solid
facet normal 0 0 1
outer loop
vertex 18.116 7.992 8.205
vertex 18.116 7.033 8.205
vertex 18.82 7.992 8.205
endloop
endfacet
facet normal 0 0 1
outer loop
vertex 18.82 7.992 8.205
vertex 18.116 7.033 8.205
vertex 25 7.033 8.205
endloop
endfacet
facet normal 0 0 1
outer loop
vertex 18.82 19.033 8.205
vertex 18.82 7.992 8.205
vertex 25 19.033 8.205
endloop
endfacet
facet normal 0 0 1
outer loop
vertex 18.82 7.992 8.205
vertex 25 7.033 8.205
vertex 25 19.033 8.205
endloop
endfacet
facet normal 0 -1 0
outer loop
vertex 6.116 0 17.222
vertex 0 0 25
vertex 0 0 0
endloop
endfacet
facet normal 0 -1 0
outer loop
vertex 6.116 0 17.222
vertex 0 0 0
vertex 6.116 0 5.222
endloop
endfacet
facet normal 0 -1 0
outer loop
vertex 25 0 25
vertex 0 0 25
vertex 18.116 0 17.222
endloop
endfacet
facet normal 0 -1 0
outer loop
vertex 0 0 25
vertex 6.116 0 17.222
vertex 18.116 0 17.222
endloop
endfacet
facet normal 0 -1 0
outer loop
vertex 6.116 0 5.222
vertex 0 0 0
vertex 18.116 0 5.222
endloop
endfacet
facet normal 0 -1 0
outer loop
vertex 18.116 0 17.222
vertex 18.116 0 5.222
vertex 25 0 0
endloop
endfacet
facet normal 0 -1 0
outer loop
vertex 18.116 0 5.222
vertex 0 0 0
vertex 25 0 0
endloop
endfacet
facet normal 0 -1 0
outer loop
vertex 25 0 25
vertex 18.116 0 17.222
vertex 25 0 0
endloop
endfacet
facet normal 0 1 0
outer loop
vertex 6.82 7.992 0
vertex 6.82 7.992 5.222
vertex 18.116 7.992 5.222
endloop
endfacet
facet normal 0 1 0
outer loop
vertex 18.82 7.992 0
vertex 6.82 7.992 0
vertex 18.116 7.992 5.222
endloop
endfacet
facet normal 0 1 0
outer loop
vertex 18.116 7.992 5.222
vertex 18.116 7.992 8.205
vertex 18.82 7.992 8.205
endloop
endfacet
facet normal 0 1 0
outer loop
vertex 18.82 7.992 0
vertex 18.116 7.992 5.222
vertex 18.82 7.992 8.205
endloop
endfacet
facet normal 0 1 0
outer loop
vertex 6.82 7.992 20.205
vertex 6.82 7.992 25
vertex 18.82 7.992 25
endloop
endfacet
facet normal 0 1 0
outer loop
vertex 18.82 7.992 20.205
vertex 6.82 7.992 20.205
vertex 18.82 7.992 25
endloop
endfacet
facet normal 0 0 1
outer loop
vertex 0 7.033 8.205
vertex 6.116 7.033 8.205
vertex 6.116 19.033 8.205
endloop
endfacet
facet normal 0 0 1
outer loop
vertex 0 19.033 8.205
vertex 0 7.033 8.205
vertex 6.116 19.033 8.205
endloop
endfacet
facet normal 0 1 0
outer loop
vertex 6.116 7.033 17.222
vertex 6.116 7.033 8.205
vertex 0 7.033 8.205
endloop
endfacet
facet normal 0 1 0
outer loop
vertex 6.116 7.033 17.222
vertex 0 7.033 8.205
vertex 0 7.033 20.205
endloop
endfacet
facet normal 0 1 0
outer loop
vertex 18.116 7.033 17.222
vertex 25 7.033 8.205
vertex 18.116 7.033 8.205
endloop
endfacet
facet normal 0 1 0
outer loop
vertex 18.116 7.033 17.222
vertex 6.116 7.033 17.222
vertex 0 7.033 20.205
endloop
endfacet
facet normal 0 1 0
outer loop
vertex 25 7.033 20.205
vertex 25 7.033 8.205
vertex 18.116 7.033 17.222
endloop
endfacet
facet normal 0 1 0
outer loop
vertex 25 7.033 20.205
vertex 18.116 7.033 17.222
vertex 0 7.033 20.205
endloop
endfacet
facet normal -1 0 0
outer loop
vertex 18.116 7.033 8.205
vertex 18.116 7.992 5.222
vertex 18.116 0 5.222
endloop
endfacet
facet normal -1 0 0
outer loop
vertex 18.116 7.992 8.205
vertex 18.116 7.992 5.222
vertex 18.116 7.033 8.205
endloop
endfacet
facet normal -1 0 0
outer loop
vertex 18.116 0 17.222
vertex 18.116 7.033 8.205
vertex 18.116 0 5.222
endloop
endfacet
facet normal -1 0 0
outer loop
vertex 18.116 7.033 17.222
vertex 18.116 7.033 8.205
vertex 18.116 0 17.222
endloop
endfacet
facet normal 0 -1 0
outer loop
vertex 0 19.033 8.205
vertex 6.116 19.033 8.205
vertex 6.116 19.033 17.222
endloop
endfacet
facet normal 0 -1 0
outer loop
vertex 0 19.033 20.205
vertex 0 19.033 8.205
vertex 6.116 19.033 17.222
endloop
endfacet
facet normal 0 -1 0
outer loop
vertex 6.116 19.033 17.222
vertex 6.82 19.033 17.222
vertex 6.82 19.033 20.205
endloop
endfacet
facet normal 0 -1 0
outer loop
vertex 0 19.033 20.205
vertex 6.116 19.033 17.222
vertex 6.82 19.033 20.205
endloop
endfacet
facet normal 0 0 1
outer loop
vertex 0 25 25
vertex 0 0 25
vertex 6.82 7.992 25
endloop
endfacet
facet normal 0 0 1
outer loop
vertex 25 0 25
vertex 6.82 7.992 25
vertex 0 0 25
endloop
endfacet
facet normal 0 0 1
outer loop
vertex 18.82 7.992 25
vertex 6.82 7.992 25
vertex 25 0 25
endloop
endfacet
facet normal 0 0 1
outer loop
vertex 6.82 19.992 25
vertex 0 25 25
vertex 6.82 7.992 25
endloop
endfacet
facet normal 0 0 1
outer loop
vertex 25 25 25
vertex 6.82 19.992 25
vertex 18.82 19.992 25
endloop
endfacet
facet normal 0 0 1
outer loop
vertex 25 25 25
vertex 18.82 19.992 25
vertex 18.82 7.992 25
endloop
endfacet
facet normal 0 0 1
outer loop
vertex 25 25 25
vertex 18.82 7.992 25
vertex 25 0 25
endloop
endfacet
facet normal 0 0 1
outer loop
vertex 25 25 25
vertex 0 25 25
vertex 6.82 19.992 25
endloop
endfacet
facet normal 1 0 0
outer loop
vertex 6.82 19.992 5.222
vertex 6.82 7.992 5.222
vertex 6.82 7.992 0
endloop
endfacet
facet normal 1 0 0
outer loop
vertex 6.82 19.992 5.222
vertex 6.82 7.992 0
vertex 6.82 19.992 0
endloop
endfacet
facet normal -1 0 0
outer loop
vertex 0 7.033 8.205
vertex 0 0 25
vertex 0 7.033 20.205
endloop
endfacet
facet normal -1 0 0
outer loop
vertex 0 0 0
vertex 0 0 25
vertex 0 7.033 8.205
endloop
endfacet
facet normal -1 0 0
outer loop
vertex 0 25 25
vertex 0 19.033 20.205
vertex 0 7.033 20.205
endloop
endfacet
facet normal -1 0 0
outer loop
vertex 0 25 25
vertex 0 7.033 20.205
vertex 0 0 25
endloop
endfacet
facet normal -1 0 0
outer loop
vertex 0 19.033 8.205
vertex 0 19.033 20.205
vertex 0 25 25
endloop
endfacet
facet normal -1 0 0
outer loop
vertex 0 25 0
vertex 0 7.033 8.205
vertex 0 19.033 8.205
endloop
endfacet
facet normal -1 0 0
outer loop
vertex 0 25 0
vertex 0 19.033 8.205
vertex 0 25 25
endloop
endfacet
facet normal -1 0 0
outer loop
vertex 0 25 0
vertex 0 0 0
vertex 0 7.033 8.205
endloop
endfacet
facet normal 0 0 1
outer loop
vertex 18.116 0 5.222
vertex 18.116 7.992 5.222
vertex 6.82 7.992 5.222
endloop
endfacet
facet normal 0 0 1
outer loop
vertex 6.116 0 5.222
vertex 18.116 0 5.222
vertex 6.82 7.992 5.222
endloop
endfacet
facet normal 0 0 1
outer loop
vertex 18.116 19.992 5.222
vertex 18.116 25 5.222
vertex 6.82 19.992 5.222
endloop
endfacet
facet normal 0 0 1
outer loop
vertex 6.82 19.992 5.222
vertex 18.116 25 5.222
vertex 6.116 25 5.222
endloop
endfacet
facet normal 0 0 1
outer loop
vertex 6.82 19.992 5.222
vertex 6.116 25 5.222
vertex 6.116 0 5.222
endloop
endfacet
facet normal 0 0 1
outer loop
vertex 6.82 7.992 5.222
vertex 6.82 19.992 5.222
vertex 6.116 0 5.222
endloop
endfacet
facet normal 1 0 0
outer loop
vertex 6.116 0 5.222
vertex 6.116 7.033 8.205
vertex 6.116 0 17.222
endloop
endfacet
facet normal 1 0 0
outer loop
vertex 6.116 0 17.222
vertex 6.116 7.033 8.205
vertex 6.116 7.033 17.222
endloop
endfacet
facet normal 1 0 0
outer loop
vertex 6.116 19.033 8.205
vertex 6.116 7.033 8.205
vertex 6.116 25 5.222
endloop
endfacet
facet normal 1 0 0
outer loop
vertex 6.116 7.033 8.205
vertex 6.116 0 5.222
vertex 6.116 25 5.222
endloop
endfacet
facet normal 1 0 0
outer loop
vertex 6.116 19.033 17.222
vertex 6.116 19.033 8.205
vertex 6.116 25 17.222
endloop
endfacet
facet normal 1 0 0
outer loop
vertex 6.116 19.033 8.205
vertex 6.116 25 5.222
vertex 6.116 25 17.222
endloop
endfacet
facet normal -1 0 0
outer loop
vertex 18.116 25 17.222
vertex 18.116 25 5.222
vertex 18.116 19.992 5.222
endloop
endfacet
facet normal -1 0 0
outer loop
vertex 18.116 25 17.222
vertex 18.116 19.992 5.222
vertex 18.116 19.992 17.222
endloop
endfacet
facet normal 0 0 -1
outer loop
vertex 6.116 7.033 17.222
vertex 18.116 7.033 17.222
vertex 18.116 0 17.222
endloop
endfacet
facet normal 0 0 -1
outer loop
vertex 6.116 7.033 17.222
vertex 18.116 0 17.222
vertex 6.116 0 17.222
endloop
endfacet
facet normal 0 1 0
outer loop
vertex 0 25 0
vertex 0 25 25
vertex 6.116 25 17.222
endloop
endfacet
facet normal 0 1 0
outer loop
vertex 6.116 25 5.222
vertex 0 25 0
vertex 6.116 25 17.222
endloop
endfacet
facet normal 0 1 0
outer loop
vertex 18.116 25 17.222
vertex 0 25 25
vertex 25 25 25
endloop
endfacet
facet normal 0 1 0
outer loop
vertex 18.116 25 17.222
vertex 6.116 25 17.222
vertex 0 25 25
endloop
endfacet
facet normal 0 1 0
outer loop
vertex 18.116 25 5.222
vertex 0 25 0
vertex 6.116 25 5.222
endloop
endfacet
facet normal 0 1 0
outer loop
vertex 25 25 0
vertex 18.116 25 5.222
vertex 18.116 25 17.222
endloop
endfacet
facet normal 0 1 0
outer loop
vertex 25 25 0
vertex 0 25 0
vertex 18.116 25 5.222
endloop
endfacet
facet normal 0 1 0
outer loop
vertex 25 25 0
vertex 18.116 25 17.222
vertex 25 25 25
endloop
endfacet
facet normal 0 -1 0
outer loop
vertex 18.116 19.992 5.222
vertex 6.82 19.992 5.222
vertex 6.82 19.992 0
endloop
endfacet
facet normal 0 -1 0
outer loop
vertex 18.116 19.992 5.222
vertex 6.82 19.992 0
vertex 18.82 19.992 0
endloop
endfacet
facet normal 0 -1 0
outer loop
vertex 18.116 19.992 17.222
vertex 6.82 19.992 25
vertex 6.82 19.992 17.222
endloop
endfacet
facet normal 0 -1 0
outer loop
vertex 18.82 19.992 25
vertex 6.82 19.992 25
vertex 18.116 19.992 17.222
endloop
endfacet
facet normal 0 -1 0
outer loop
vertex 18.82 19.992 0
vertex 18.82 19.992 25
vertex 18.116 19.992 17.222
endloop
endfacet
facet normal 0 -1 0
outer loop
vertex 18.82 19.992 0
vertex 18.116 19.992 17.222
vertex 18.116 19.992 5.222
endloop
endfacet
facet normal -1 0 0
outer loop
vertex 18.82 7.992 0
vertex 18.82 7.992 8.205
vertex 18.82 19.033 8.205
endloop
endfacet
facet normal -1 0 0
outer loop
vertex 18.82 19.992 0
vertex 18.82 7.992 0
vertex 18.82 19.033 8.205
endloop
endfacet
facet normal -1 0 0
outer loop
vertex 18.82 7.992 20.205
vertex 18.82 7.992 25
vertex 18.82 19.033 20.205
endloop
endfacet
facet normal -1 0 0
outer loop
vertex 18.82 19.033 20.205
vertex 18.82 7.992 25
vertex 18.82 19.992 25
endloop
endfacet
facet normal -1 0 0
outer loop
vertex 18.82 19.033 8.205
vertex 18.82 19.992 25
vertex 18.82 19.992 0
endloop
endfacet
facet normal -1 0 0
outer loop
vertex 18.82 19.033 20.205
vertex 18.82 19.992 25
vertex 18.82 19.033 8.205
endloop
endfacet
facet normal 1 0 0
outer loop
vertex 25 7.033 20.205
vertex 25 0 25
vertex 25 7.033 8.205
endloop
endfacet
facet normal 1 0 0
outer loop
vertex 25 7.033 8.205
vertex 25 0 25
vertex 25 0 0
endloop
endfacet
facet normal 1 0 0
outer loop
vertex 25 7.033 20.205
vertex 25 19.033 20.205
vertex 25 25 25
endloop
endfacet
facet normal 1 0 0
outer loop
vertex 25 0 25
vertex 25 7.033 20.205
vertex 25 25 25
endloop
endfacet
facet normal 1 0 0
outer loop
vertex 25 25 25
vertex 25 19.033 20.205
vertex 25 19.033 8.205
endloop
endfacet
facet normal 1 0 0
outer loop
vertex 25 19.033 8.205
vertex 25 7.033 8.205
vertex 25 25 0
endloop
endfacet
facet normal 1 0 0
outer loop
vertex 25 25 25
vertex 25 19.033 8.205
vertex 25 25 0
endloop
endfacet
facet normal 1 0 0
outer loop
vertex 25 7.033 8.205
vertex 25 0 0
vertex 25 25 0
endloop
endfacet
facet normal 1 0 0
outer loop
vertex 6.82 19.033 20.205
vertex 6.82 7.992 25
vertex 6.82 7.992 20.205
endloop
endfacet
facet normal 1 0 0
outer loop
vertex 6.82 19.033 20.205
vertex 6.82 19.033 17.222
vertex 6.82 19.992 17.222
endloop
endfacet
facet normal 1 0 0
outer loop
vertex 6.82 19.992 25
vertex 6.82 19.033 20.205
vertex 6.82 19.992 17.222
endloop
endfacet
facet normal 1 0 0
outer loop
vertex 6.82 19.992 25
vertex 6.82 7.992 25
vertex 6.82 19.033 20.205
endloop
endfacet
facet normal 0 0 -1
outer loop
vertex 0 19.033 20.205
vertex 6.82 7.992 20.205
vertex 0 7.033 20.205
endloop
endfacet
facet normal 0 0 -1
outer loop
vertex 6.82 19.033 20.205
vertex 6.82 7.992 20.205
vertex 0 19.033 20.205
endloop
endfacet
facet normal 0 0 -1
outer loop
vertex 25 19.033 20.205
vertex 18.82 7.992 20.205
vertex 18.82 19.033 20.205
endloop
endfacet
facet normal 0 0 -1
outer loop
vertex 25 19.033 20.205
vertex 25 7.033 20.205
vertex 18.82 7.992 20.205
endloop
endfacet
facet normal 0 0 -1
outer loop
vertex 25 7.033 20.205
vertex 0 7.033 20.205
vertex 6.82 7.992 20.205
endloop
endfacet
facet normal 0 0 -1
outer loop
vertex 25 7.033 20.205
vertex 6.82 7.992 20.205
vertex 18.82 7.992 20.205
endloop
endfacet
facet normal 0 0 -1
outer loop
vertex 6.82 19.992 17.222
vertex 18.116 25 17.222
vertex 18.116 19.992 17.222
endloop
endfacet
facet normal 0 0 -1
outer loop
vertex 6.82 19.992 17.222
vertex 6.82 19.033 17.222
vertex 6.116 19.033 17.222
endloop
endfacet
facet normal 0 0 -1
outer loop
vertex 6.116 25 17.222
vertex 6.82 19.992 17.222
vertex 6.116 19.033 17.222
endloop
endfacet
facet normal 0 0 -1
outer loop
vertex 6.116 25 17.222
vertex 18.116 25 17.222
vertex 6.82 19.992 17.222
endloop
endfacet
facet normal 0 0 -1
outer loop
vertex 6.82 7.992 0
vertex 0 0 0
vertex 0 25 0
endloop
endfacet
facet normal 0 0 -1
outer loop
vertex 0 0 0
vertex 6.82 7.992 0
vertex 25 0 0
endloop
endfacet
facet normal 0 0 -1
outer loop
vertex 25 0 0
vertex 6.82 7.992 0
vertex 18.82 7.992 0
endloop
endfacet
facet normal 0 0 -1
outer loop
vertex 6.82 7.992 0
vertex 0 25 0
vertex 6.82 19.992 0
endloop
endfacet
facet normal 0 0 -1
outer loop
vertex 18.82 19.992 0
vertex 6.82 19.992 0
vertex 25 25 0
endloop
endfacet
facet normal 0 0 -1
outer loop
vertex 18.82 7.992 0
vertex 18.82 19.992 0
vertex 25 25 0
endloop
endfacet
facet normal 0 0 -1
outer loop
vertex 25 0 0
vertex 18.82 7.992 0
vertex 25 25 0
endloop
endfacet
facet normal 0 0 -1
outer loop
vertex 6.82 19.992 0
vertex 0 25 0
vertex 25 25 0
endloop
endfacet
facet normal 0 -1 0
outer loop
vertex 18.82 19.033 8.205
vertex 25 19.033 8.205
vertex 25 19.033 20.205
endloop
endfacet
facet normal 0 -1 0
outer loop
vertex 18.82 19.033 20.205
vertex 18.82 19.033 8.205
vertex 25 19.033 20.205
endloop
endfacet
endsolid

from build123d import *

# Parameters (mm, degrees)
F0_W     = 25
F0_H     = 25
F1_DEPTH = 25
F2_W     = 12
F2_H     = 12
F3_DEPTH = 25
F4_W     = 12
F4_H     = 12
F5_DEPTH = 25
F6_W     = 12
F6_H     = 12
F7_DEPTH = 25


with BuildPart() as f1:
    # F0 (on Top) → F1 (new body)
    with BuildSketch(Plane.XY):
        with Locations((12.5, 12.5)):
            Rectangle(F0_W, F0_H)
    extrude(amount=F1_DEPTH)

    # F2 (on face) → F3 (cut)
    with BuildSketch(Plane.XY.offset(25)):
        with Locations((12.820027, 13.99222)):
            Rectangle(F2_W, F2_H)
    extrude(amount=-F3_DEPTH, mode=Mode.SUBTRACT)

    # F4 (on face) → F5 (cut)
    with BuildSketch(Plane(origin=(0, 25, 0), x_dir=(-1, 0, 0), z_dir=(0, 1, 0))):
        with Locations((-12.115697, 11.221583)):
            Rectangle(F4_W, F4_H)
    extrude(amount=-F5_DEPTH, mode=Mode.SUBTRACT)

    # F6 (on face) → F7 (cut)
    with BuildSketch(Plane.YZ.offset(25)):
        with Locations((13.033153, 14.205345)):
            Rectangle(F6_W, F6_H)
    extrude(amount=-F7_DEPTH, mode=Mode.SUBTRACT)


solid = f1.part
